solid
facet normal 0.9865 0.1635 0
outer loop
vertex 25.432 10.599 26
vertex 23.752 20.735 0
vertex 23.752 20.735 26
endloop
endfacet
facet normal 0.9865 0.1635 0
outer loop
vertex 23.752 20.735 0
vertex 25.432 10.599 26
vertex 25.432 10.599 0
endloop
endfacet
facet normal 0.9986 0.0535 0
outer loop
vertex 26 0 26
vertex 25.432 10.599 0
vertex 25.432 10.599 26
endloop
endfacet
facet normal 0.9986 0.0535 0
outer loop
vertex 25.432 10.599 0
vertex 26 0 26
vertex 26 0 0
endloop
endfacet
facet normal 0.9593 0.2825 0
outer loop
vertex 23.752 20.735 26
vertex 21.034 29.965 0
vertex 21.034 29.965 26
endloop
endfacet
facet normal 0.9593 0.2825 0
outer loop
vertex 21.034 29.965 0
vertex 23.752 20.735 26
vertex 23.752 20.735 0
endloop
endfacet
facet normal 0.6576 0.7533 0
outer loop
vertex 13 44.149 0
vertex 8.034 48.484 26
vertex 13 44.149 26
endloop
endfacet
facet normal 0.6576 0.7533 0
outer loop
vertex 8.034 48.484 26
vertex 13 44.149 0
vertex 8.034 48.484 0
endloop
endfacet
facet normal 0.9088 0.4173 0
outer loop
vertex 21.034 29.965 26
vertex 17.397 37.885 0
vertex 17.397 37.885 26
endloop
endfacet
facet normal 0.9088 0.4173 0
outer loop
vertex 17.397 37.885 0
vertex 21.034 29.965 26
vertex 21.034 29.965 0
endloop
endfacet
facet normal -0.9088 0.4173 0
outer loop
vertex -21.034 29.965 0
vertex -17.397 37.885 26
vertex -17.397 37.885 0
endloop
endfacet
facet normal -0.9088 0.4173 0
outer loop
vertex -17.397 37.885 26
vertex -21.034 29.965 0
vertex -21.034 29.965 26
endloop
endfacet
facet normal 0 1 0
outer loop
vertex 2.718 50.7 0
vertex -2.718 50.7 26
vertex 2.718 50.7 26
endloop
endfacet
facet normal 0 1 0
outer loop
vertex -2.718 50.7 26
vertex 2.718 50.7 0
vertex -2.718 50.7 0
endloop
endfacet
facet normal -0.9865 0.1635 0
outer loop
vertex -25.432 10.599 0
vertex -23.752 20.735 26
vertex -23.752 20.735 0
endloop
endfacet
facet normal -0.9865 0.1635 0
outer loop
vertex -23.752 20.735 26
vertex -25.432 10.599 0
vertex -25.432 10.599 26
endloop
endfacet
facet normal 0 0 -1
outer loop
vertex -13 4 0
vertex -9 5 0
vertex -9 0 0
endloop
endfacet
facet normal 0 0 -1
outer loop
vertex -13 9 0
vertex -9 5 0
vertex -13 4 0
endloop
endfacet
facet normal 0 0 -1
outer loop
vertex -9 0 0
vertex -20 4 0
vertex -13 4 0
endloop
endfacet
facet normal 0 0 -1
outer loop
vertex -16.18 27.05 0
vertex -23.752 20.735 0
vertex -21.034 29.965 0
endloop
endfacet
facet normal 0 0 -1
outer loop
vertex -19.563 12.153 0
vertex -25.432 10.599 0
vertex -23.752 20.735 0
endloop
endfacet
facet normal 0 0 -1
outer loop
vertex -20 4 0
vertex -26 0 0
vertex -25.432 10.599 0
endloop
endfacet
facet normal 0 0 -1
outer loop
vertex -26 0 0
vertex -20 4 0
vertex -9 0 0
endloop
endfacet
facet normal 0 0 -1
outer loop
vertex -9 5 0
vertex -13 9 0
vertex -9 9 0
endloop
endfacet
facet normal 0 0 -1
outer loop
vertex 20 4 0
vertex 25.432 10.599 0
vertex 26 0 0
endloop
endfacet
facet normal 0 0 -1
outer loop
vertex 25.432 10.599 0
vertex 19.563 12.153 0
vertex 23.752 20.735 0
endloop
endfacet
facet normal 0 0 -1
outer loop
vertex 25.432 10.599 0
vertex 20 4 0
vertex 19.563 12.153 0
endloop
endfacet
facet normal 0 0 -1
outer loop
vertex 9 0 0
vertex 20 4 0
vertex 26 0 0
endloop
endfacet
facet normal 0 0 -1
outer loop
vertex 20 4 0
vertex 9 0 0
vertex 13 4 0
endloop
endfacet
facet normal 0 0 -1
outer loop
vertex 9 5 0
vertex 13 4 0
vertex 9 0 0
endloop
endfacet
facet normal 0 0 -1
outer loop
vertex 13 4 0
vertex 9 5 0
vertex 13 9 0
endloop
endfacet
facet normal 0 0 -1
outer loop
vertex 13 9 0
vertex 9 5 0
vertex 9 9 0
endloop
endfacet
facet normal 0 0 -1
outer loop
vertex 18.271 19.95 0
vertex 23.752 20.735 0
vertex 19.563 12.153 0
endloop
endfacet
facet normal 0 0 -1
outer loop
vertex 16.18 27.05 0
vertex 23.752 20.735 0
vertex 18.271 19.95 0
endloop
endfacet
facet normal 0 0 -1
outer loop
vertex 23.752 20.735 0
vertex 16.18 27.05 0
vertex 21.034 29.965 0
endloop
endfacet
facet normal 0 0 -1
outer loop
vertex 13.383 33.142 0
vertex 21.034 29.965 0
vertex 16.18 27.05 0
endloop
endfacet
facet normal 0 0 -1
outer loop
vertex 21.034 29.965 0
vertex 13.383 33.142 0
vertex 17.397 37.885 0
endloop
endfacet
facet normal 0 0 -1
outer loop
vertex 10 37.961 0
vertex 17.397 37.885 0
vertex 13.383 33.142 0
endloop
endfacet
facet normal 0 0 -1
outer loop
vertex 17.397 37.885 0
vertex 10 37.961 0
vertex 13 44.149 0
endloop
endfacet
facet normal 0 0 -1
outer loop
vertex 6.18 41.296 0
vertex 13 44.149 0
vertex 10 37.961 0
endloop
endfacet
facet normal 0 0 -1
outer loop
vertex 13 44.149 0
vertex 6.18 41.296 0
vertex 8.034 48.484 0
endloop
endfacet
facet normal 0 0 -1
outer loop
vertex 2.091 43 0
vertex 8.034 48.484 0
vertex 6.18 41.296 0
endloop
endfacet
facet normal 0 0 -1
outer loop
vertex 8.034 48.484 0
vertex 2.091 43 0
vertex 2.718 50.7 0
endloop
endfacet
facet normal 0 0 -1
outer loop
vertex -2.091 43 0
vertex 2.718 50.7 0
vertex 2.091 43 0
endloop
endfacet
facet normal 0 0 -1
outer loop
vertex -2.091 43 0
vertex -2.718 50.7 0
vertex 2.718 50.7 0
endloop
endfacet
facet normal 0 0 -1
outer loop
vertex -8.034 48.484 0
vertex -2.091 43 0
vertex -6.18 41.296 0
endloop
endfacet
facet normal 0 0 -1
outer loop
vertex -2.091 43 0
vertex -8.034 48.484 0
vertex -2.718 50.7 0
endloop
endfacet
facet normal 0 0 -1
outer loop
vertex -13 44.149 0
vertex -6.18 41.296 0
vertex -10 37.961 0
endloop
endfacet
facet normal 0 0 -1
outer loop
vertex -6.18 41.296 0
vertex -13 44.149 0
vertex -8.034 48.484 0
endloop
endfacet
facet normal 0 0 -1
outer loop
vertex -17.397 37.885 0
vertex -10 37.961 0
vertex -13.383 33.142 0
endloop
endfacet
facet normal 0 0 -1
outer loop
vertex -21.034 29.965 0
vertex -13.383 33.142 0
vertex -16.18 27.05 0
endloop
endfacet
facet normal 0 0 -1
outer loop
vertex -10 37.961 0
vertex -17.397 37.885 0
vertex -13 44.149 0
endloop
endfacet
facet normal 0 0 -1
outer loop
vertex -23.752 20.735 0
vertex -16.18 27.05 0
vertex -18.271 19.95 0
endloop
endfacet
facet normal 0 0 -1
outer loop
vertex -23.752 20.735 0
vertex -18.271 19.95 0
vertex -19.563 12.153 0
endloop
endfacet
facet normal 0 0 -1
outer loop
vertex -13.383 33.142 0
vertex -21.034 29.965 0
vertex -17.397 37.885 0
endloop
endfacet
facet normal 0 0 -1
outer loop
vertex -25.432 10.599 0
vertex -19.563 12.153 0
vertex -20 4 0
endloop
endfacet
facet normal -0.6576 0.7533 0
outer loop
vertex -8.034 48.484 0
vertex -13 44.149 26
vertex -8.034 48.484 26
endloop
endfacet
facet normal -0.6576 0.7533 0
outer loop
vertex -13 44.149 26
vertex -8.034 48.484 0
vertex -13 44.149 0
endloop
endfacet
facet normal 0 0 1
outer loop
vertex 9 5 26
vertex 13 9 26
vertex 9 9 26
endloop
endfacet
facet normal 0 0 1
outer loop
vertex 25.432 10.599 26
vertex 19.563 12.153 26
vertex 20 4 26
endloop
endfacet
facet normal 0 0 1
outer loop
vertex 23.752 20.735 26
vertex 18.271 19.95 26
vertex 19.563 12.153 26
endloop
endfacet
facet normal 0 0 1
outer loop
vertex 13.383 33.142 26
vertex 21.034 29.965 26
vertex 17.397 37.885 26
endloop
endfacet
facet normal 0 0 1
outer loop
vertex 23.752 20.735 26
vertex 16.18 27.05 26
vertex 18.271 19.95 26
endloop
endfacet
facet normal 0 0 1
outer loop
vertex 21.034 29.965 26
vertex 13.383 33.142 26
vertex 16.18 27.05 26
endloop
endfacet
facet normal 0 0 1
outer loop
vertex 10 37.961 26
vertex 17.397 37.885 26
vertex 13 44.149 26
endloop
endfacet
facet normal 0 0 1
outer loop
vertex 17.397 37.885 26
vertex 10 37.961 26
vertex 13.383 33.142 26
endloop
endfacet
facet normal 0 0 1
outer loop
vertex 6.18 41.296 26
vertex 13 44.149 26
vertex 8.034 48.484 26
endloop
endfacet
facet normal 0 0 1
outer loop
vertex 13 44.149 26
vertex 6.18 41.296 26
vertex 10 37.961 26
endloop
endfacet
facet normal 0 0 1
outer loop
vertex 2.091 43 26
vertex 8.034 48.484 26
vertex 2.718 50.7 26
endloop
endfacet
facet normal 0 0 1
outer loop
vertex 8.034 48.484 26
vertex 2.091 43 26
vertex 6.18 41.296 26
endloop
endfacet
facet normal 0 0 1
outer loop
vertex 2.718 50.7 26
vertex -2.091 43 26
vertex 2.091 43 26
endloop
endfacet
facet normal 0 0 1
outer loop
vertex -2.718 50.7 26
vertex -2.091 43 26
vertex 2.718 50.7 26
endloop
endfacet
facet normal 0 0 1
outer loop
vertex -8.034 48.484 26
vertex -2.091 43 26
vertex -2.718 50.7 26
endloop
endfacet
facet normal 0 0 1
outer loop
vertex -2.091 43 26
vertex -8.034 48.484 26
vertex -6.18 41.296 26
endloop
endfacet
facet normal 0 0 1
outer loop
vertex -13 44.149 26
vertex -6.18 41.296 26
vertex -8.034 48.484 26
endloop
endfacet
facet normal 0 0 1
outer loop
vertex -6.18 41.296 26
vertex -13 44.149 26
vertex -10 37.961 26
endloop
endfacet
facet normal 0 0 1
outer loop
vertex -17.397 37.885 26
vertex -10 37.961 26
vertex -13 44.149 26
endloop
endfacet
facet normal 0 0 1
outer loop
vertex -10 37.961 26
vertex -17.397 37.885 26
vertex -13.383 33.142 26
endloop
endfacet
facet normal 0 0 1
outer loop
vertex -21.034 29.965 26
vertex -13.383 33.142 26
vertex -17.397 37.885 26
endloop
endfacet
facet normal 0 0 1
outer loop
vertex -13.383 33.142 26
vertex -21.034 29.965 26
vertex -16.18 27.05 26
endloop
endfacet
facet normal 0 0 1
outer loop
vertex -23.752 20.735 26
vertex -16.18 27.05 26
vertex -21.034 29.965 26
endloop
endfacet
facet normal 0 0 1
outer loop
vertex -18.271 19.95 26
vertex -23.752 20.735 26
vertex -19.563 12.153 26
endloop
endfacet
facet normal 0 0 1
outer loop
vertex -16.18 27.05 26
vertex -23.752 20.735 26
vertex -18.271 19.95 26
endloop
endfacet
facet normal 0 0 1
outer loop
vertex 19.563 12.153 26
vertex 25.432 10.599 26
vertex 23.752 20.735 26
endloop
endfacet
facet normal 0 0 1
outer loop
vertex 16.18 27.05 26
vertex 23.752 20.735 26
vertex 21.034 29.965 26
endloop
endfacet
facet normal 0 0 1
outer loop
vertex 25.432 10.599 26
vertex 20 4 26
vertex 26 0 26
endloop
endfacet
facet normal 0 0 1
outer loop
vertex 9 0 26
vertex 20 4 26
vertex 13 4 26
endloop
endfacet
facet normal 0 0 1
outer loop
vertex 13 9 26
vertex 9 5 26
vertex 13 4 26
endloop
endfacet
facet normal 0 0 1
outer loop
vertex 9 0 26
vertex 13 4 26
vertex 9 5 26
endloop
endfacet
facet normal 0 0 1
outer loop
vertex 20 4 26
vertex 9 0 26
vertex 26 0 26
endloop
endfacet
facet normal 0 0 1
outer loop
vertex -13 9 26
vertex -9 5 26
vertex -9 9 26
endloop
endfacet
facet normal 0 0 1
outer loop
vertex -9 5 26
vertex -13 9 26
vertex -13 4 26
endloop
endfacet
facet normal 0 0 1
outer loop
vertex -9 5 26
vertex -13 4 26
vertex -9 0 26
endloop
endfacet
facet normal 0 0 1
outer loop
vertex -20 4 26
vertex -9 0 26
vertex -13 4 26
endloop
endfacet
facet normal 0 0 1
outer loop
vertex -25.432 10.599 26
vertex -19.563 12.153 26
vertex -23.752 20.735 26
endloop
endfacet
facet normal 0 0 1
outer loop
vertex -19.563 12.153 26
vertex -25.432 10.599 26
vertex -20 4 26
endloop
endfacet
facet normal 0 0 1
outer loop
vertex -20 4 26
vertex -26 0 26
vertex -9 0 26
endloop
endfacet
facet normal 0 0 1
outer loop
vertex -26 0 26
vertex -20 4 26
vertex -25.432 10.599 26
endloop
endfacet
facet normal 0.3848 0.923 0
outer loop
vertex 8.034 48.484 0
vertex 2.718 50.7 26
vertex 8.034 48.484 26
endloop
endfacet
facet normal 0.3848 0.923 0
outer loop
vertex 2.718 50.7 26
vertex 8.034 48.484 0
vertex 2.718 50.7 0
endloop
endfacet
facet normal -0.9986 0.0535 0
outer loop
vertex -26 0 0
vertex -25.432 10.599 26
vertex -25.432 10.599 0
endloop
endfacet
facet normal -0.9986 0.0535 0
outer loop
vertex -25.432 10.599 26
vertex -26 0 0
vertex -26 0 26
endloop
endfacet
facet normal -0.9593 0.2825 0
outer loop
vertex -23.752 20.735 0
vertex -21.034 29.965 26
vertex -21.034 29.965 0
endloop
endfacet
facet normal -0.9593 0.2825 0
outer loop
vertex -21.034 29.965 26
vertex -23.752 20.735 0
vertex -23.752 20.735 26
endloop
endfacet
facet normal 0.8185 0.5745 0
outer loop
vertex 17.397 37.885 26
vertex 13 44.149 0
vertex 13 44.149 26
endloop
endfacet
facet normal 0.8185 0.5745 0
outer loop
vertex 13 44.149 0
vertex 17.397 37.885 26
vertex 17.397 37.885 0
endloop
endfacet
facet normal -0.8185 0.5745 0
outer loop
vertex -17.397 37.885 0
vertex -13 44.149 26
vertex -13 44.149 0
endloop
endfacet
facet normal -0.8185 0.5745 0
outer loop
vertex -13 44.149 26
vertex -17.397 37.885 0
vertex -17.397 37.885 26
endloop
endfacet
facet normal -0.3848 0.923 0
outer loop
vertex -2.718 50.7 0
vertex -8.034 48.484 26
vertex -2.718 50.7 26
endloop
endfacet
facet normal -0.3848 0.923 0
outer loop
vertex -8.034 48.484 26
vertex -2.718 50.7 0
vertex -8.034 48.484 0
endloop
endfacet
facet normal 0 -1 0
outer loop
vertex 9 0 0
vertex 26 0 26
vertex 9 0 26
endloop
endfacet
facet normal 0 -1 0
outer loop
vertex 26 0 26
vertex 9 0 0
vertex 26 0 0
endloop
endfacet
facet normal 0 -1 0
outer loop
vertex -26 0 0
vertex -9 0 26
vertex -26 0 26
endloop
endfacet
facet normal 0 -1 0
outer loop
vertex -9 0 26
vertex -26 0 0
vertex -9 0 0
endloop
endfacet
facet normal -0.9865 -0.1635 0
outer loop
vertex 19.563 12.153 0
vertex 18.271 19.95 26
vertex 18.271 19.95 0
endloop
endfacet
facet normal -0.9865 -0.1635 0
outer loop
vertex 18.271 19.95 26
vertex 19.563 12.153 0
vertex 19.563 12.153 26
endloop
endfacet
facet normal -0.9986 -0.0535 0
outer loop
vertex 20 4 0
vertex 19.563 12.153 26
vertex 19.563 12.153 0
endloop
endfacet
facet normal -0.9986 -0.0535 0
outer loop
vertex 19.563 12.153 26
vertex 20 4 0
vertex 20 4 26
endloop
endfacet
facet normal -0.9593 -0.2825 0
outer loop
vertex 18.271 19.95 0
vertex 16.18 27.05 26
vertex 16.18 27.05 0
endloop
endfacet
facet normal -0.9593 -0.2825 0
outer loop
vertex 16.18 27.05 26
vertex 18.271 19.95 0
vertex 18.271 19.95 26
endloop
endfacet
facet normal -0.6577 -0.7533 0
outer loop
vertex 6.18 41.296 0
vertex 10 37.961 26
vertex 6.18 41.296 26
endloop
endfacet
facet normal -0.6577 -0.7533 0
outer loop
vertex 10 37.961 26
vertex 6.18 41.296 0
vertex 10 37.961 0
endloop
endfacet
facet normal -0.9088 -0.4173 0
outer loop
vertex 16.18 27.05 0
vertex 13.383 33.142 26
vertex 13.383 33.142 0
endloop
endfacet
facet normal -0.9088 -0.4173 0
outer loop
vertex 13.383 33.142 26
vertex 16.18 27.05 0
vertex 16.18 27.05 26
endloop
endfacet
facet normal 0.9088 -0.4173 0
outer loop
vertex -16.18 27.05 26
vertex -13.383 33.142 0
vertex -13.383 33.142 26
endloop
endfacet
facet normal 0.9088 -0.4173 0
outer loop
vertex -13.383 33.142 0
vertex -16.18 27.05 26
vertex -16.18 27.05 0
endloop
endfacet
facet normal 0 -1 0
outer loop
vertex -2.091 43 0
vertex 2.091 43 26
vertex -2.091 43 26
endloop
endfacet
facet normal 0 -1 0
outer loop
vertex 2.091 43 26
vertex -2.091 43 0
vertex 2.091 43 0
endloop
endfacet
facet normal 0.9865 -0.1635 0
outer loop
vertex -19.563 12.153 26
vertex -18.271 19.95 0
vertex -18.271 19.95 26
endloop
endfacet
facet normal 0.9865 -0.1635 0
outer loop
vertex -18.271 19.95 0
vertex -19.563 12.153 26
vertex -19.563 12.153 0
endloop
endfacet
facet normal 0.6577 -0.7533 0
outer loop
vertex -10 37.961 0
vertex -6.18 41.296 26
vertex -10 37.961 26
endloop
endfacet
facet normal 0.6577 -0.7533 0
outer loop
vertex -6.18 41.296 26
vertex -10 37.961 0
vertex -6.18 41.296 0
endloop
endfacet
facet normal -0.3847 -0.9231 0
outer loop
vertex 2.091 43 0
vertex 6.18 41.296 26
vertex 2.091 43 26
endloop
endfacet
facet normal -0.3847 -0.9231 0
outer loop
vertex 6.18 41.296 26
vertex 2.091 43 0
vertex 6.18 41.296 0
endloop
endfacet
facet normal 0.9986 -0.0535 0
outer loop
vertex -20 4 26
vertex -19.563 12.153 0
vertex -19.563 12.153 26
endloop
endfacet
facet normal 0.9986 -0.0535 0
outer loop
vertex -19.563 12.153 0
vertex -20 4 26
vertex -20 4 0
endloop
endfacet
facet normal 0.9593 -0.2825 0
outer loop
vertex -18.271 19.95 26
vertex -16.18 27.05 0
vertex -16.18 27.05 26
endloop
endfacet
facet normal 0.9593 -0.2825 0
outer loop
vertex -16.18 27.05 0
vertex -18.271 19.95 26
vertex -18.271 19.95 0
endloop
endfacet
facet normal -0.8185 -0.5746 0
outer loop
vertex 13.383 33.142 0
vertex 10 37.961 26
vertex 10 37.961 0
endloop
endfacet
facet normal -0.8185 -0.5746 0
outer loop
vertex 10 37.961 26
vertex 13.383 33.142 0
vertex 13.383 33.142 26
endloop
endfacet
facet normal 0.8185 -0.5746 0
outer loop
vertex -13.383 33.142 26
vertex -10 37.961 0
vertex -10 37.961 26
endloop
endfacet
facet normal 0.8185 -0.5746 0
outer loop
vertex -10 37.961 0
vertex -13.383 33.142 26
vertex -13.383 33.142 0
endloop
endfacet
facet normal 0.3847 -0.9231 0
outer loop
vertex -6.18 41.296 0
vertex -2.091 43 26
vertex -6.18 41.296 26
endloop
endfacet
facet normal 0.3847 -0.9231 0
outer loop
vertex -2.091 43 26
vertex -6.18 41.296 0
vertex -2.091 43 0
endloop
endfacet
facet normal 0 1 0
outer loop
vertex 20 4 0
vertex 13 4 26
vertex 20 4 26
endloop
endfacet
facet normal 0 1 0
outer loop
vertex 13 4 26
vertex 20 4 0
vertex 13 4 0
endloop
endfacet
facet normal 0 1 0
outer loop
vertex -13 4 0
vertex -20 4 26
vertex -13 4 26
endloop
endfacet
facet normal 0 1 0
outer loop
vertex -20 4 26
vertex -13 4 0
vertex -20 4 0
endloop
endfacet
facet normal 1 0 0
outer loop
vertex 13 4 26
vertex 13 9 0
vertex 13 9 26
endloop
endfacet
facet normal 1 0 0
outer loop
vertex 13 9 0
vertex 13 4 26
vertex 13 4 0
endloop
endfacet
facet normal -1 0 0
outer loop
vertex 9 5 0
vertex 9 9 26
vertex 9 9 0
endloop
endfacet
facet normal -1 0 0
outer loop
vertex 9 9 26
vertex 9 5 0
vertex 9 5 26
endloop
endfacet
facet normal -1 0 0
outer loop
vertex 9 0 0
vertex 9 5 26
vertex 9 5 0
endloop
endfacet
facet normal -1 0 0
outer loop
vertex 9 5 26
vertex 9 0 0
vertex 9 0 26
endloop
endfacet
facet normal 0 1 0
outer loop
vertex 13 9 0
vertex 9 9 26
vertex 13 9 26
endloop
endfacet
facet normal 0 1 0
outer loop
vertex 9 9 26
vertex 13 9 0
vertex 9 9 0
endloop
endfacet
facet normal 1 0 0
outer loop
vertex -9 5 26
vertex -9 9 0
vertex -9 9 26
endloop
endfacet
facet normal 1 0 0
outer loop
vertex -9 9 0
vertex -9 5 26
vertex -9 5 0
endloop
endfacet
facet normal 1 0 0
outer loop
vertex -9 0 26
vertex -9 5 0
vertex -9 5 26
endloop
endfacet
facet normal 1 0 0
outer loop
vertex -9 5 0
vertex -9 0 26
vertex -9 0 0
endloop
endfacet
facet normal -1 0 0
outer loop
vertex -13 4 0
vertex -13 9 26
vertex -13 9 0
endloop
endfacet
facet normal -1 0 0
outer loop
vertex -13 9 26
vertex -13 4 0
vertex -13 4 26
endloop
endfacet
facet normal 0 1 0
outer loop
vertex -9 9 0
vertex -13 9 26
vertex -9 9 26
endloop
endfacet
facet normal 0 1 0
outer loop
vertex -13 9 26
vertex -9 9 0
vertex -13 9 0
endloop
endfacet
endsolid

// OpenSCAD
// 40 wide 39 tall U shape with wings

module leg_section() {
    difference() {
        resize([40,39*2,20]) cylinder(h=20,d=40);
        translate([-100,-200,-50]) cube([200,200,200]);
    }
}

difference() {
    scale(1.3) leg_section();
    difference() {
        translate([0,4,-10]) resize([0,0,40]) leg_section();
        translate([16-7,4,0]) cube([4,5,40]);
        translate([-16+7-4,4,0]) cube([4,5,40]);
    }
    translate([-9,0,0]) cube([18,5,40]);
}

// a small cross-section fits around the chair leg, but this design won't flex enough to go on normally. Better to build an interlocking thing - two halves of the arch, with a plastic stick that goes through and is also the roomba buffer
